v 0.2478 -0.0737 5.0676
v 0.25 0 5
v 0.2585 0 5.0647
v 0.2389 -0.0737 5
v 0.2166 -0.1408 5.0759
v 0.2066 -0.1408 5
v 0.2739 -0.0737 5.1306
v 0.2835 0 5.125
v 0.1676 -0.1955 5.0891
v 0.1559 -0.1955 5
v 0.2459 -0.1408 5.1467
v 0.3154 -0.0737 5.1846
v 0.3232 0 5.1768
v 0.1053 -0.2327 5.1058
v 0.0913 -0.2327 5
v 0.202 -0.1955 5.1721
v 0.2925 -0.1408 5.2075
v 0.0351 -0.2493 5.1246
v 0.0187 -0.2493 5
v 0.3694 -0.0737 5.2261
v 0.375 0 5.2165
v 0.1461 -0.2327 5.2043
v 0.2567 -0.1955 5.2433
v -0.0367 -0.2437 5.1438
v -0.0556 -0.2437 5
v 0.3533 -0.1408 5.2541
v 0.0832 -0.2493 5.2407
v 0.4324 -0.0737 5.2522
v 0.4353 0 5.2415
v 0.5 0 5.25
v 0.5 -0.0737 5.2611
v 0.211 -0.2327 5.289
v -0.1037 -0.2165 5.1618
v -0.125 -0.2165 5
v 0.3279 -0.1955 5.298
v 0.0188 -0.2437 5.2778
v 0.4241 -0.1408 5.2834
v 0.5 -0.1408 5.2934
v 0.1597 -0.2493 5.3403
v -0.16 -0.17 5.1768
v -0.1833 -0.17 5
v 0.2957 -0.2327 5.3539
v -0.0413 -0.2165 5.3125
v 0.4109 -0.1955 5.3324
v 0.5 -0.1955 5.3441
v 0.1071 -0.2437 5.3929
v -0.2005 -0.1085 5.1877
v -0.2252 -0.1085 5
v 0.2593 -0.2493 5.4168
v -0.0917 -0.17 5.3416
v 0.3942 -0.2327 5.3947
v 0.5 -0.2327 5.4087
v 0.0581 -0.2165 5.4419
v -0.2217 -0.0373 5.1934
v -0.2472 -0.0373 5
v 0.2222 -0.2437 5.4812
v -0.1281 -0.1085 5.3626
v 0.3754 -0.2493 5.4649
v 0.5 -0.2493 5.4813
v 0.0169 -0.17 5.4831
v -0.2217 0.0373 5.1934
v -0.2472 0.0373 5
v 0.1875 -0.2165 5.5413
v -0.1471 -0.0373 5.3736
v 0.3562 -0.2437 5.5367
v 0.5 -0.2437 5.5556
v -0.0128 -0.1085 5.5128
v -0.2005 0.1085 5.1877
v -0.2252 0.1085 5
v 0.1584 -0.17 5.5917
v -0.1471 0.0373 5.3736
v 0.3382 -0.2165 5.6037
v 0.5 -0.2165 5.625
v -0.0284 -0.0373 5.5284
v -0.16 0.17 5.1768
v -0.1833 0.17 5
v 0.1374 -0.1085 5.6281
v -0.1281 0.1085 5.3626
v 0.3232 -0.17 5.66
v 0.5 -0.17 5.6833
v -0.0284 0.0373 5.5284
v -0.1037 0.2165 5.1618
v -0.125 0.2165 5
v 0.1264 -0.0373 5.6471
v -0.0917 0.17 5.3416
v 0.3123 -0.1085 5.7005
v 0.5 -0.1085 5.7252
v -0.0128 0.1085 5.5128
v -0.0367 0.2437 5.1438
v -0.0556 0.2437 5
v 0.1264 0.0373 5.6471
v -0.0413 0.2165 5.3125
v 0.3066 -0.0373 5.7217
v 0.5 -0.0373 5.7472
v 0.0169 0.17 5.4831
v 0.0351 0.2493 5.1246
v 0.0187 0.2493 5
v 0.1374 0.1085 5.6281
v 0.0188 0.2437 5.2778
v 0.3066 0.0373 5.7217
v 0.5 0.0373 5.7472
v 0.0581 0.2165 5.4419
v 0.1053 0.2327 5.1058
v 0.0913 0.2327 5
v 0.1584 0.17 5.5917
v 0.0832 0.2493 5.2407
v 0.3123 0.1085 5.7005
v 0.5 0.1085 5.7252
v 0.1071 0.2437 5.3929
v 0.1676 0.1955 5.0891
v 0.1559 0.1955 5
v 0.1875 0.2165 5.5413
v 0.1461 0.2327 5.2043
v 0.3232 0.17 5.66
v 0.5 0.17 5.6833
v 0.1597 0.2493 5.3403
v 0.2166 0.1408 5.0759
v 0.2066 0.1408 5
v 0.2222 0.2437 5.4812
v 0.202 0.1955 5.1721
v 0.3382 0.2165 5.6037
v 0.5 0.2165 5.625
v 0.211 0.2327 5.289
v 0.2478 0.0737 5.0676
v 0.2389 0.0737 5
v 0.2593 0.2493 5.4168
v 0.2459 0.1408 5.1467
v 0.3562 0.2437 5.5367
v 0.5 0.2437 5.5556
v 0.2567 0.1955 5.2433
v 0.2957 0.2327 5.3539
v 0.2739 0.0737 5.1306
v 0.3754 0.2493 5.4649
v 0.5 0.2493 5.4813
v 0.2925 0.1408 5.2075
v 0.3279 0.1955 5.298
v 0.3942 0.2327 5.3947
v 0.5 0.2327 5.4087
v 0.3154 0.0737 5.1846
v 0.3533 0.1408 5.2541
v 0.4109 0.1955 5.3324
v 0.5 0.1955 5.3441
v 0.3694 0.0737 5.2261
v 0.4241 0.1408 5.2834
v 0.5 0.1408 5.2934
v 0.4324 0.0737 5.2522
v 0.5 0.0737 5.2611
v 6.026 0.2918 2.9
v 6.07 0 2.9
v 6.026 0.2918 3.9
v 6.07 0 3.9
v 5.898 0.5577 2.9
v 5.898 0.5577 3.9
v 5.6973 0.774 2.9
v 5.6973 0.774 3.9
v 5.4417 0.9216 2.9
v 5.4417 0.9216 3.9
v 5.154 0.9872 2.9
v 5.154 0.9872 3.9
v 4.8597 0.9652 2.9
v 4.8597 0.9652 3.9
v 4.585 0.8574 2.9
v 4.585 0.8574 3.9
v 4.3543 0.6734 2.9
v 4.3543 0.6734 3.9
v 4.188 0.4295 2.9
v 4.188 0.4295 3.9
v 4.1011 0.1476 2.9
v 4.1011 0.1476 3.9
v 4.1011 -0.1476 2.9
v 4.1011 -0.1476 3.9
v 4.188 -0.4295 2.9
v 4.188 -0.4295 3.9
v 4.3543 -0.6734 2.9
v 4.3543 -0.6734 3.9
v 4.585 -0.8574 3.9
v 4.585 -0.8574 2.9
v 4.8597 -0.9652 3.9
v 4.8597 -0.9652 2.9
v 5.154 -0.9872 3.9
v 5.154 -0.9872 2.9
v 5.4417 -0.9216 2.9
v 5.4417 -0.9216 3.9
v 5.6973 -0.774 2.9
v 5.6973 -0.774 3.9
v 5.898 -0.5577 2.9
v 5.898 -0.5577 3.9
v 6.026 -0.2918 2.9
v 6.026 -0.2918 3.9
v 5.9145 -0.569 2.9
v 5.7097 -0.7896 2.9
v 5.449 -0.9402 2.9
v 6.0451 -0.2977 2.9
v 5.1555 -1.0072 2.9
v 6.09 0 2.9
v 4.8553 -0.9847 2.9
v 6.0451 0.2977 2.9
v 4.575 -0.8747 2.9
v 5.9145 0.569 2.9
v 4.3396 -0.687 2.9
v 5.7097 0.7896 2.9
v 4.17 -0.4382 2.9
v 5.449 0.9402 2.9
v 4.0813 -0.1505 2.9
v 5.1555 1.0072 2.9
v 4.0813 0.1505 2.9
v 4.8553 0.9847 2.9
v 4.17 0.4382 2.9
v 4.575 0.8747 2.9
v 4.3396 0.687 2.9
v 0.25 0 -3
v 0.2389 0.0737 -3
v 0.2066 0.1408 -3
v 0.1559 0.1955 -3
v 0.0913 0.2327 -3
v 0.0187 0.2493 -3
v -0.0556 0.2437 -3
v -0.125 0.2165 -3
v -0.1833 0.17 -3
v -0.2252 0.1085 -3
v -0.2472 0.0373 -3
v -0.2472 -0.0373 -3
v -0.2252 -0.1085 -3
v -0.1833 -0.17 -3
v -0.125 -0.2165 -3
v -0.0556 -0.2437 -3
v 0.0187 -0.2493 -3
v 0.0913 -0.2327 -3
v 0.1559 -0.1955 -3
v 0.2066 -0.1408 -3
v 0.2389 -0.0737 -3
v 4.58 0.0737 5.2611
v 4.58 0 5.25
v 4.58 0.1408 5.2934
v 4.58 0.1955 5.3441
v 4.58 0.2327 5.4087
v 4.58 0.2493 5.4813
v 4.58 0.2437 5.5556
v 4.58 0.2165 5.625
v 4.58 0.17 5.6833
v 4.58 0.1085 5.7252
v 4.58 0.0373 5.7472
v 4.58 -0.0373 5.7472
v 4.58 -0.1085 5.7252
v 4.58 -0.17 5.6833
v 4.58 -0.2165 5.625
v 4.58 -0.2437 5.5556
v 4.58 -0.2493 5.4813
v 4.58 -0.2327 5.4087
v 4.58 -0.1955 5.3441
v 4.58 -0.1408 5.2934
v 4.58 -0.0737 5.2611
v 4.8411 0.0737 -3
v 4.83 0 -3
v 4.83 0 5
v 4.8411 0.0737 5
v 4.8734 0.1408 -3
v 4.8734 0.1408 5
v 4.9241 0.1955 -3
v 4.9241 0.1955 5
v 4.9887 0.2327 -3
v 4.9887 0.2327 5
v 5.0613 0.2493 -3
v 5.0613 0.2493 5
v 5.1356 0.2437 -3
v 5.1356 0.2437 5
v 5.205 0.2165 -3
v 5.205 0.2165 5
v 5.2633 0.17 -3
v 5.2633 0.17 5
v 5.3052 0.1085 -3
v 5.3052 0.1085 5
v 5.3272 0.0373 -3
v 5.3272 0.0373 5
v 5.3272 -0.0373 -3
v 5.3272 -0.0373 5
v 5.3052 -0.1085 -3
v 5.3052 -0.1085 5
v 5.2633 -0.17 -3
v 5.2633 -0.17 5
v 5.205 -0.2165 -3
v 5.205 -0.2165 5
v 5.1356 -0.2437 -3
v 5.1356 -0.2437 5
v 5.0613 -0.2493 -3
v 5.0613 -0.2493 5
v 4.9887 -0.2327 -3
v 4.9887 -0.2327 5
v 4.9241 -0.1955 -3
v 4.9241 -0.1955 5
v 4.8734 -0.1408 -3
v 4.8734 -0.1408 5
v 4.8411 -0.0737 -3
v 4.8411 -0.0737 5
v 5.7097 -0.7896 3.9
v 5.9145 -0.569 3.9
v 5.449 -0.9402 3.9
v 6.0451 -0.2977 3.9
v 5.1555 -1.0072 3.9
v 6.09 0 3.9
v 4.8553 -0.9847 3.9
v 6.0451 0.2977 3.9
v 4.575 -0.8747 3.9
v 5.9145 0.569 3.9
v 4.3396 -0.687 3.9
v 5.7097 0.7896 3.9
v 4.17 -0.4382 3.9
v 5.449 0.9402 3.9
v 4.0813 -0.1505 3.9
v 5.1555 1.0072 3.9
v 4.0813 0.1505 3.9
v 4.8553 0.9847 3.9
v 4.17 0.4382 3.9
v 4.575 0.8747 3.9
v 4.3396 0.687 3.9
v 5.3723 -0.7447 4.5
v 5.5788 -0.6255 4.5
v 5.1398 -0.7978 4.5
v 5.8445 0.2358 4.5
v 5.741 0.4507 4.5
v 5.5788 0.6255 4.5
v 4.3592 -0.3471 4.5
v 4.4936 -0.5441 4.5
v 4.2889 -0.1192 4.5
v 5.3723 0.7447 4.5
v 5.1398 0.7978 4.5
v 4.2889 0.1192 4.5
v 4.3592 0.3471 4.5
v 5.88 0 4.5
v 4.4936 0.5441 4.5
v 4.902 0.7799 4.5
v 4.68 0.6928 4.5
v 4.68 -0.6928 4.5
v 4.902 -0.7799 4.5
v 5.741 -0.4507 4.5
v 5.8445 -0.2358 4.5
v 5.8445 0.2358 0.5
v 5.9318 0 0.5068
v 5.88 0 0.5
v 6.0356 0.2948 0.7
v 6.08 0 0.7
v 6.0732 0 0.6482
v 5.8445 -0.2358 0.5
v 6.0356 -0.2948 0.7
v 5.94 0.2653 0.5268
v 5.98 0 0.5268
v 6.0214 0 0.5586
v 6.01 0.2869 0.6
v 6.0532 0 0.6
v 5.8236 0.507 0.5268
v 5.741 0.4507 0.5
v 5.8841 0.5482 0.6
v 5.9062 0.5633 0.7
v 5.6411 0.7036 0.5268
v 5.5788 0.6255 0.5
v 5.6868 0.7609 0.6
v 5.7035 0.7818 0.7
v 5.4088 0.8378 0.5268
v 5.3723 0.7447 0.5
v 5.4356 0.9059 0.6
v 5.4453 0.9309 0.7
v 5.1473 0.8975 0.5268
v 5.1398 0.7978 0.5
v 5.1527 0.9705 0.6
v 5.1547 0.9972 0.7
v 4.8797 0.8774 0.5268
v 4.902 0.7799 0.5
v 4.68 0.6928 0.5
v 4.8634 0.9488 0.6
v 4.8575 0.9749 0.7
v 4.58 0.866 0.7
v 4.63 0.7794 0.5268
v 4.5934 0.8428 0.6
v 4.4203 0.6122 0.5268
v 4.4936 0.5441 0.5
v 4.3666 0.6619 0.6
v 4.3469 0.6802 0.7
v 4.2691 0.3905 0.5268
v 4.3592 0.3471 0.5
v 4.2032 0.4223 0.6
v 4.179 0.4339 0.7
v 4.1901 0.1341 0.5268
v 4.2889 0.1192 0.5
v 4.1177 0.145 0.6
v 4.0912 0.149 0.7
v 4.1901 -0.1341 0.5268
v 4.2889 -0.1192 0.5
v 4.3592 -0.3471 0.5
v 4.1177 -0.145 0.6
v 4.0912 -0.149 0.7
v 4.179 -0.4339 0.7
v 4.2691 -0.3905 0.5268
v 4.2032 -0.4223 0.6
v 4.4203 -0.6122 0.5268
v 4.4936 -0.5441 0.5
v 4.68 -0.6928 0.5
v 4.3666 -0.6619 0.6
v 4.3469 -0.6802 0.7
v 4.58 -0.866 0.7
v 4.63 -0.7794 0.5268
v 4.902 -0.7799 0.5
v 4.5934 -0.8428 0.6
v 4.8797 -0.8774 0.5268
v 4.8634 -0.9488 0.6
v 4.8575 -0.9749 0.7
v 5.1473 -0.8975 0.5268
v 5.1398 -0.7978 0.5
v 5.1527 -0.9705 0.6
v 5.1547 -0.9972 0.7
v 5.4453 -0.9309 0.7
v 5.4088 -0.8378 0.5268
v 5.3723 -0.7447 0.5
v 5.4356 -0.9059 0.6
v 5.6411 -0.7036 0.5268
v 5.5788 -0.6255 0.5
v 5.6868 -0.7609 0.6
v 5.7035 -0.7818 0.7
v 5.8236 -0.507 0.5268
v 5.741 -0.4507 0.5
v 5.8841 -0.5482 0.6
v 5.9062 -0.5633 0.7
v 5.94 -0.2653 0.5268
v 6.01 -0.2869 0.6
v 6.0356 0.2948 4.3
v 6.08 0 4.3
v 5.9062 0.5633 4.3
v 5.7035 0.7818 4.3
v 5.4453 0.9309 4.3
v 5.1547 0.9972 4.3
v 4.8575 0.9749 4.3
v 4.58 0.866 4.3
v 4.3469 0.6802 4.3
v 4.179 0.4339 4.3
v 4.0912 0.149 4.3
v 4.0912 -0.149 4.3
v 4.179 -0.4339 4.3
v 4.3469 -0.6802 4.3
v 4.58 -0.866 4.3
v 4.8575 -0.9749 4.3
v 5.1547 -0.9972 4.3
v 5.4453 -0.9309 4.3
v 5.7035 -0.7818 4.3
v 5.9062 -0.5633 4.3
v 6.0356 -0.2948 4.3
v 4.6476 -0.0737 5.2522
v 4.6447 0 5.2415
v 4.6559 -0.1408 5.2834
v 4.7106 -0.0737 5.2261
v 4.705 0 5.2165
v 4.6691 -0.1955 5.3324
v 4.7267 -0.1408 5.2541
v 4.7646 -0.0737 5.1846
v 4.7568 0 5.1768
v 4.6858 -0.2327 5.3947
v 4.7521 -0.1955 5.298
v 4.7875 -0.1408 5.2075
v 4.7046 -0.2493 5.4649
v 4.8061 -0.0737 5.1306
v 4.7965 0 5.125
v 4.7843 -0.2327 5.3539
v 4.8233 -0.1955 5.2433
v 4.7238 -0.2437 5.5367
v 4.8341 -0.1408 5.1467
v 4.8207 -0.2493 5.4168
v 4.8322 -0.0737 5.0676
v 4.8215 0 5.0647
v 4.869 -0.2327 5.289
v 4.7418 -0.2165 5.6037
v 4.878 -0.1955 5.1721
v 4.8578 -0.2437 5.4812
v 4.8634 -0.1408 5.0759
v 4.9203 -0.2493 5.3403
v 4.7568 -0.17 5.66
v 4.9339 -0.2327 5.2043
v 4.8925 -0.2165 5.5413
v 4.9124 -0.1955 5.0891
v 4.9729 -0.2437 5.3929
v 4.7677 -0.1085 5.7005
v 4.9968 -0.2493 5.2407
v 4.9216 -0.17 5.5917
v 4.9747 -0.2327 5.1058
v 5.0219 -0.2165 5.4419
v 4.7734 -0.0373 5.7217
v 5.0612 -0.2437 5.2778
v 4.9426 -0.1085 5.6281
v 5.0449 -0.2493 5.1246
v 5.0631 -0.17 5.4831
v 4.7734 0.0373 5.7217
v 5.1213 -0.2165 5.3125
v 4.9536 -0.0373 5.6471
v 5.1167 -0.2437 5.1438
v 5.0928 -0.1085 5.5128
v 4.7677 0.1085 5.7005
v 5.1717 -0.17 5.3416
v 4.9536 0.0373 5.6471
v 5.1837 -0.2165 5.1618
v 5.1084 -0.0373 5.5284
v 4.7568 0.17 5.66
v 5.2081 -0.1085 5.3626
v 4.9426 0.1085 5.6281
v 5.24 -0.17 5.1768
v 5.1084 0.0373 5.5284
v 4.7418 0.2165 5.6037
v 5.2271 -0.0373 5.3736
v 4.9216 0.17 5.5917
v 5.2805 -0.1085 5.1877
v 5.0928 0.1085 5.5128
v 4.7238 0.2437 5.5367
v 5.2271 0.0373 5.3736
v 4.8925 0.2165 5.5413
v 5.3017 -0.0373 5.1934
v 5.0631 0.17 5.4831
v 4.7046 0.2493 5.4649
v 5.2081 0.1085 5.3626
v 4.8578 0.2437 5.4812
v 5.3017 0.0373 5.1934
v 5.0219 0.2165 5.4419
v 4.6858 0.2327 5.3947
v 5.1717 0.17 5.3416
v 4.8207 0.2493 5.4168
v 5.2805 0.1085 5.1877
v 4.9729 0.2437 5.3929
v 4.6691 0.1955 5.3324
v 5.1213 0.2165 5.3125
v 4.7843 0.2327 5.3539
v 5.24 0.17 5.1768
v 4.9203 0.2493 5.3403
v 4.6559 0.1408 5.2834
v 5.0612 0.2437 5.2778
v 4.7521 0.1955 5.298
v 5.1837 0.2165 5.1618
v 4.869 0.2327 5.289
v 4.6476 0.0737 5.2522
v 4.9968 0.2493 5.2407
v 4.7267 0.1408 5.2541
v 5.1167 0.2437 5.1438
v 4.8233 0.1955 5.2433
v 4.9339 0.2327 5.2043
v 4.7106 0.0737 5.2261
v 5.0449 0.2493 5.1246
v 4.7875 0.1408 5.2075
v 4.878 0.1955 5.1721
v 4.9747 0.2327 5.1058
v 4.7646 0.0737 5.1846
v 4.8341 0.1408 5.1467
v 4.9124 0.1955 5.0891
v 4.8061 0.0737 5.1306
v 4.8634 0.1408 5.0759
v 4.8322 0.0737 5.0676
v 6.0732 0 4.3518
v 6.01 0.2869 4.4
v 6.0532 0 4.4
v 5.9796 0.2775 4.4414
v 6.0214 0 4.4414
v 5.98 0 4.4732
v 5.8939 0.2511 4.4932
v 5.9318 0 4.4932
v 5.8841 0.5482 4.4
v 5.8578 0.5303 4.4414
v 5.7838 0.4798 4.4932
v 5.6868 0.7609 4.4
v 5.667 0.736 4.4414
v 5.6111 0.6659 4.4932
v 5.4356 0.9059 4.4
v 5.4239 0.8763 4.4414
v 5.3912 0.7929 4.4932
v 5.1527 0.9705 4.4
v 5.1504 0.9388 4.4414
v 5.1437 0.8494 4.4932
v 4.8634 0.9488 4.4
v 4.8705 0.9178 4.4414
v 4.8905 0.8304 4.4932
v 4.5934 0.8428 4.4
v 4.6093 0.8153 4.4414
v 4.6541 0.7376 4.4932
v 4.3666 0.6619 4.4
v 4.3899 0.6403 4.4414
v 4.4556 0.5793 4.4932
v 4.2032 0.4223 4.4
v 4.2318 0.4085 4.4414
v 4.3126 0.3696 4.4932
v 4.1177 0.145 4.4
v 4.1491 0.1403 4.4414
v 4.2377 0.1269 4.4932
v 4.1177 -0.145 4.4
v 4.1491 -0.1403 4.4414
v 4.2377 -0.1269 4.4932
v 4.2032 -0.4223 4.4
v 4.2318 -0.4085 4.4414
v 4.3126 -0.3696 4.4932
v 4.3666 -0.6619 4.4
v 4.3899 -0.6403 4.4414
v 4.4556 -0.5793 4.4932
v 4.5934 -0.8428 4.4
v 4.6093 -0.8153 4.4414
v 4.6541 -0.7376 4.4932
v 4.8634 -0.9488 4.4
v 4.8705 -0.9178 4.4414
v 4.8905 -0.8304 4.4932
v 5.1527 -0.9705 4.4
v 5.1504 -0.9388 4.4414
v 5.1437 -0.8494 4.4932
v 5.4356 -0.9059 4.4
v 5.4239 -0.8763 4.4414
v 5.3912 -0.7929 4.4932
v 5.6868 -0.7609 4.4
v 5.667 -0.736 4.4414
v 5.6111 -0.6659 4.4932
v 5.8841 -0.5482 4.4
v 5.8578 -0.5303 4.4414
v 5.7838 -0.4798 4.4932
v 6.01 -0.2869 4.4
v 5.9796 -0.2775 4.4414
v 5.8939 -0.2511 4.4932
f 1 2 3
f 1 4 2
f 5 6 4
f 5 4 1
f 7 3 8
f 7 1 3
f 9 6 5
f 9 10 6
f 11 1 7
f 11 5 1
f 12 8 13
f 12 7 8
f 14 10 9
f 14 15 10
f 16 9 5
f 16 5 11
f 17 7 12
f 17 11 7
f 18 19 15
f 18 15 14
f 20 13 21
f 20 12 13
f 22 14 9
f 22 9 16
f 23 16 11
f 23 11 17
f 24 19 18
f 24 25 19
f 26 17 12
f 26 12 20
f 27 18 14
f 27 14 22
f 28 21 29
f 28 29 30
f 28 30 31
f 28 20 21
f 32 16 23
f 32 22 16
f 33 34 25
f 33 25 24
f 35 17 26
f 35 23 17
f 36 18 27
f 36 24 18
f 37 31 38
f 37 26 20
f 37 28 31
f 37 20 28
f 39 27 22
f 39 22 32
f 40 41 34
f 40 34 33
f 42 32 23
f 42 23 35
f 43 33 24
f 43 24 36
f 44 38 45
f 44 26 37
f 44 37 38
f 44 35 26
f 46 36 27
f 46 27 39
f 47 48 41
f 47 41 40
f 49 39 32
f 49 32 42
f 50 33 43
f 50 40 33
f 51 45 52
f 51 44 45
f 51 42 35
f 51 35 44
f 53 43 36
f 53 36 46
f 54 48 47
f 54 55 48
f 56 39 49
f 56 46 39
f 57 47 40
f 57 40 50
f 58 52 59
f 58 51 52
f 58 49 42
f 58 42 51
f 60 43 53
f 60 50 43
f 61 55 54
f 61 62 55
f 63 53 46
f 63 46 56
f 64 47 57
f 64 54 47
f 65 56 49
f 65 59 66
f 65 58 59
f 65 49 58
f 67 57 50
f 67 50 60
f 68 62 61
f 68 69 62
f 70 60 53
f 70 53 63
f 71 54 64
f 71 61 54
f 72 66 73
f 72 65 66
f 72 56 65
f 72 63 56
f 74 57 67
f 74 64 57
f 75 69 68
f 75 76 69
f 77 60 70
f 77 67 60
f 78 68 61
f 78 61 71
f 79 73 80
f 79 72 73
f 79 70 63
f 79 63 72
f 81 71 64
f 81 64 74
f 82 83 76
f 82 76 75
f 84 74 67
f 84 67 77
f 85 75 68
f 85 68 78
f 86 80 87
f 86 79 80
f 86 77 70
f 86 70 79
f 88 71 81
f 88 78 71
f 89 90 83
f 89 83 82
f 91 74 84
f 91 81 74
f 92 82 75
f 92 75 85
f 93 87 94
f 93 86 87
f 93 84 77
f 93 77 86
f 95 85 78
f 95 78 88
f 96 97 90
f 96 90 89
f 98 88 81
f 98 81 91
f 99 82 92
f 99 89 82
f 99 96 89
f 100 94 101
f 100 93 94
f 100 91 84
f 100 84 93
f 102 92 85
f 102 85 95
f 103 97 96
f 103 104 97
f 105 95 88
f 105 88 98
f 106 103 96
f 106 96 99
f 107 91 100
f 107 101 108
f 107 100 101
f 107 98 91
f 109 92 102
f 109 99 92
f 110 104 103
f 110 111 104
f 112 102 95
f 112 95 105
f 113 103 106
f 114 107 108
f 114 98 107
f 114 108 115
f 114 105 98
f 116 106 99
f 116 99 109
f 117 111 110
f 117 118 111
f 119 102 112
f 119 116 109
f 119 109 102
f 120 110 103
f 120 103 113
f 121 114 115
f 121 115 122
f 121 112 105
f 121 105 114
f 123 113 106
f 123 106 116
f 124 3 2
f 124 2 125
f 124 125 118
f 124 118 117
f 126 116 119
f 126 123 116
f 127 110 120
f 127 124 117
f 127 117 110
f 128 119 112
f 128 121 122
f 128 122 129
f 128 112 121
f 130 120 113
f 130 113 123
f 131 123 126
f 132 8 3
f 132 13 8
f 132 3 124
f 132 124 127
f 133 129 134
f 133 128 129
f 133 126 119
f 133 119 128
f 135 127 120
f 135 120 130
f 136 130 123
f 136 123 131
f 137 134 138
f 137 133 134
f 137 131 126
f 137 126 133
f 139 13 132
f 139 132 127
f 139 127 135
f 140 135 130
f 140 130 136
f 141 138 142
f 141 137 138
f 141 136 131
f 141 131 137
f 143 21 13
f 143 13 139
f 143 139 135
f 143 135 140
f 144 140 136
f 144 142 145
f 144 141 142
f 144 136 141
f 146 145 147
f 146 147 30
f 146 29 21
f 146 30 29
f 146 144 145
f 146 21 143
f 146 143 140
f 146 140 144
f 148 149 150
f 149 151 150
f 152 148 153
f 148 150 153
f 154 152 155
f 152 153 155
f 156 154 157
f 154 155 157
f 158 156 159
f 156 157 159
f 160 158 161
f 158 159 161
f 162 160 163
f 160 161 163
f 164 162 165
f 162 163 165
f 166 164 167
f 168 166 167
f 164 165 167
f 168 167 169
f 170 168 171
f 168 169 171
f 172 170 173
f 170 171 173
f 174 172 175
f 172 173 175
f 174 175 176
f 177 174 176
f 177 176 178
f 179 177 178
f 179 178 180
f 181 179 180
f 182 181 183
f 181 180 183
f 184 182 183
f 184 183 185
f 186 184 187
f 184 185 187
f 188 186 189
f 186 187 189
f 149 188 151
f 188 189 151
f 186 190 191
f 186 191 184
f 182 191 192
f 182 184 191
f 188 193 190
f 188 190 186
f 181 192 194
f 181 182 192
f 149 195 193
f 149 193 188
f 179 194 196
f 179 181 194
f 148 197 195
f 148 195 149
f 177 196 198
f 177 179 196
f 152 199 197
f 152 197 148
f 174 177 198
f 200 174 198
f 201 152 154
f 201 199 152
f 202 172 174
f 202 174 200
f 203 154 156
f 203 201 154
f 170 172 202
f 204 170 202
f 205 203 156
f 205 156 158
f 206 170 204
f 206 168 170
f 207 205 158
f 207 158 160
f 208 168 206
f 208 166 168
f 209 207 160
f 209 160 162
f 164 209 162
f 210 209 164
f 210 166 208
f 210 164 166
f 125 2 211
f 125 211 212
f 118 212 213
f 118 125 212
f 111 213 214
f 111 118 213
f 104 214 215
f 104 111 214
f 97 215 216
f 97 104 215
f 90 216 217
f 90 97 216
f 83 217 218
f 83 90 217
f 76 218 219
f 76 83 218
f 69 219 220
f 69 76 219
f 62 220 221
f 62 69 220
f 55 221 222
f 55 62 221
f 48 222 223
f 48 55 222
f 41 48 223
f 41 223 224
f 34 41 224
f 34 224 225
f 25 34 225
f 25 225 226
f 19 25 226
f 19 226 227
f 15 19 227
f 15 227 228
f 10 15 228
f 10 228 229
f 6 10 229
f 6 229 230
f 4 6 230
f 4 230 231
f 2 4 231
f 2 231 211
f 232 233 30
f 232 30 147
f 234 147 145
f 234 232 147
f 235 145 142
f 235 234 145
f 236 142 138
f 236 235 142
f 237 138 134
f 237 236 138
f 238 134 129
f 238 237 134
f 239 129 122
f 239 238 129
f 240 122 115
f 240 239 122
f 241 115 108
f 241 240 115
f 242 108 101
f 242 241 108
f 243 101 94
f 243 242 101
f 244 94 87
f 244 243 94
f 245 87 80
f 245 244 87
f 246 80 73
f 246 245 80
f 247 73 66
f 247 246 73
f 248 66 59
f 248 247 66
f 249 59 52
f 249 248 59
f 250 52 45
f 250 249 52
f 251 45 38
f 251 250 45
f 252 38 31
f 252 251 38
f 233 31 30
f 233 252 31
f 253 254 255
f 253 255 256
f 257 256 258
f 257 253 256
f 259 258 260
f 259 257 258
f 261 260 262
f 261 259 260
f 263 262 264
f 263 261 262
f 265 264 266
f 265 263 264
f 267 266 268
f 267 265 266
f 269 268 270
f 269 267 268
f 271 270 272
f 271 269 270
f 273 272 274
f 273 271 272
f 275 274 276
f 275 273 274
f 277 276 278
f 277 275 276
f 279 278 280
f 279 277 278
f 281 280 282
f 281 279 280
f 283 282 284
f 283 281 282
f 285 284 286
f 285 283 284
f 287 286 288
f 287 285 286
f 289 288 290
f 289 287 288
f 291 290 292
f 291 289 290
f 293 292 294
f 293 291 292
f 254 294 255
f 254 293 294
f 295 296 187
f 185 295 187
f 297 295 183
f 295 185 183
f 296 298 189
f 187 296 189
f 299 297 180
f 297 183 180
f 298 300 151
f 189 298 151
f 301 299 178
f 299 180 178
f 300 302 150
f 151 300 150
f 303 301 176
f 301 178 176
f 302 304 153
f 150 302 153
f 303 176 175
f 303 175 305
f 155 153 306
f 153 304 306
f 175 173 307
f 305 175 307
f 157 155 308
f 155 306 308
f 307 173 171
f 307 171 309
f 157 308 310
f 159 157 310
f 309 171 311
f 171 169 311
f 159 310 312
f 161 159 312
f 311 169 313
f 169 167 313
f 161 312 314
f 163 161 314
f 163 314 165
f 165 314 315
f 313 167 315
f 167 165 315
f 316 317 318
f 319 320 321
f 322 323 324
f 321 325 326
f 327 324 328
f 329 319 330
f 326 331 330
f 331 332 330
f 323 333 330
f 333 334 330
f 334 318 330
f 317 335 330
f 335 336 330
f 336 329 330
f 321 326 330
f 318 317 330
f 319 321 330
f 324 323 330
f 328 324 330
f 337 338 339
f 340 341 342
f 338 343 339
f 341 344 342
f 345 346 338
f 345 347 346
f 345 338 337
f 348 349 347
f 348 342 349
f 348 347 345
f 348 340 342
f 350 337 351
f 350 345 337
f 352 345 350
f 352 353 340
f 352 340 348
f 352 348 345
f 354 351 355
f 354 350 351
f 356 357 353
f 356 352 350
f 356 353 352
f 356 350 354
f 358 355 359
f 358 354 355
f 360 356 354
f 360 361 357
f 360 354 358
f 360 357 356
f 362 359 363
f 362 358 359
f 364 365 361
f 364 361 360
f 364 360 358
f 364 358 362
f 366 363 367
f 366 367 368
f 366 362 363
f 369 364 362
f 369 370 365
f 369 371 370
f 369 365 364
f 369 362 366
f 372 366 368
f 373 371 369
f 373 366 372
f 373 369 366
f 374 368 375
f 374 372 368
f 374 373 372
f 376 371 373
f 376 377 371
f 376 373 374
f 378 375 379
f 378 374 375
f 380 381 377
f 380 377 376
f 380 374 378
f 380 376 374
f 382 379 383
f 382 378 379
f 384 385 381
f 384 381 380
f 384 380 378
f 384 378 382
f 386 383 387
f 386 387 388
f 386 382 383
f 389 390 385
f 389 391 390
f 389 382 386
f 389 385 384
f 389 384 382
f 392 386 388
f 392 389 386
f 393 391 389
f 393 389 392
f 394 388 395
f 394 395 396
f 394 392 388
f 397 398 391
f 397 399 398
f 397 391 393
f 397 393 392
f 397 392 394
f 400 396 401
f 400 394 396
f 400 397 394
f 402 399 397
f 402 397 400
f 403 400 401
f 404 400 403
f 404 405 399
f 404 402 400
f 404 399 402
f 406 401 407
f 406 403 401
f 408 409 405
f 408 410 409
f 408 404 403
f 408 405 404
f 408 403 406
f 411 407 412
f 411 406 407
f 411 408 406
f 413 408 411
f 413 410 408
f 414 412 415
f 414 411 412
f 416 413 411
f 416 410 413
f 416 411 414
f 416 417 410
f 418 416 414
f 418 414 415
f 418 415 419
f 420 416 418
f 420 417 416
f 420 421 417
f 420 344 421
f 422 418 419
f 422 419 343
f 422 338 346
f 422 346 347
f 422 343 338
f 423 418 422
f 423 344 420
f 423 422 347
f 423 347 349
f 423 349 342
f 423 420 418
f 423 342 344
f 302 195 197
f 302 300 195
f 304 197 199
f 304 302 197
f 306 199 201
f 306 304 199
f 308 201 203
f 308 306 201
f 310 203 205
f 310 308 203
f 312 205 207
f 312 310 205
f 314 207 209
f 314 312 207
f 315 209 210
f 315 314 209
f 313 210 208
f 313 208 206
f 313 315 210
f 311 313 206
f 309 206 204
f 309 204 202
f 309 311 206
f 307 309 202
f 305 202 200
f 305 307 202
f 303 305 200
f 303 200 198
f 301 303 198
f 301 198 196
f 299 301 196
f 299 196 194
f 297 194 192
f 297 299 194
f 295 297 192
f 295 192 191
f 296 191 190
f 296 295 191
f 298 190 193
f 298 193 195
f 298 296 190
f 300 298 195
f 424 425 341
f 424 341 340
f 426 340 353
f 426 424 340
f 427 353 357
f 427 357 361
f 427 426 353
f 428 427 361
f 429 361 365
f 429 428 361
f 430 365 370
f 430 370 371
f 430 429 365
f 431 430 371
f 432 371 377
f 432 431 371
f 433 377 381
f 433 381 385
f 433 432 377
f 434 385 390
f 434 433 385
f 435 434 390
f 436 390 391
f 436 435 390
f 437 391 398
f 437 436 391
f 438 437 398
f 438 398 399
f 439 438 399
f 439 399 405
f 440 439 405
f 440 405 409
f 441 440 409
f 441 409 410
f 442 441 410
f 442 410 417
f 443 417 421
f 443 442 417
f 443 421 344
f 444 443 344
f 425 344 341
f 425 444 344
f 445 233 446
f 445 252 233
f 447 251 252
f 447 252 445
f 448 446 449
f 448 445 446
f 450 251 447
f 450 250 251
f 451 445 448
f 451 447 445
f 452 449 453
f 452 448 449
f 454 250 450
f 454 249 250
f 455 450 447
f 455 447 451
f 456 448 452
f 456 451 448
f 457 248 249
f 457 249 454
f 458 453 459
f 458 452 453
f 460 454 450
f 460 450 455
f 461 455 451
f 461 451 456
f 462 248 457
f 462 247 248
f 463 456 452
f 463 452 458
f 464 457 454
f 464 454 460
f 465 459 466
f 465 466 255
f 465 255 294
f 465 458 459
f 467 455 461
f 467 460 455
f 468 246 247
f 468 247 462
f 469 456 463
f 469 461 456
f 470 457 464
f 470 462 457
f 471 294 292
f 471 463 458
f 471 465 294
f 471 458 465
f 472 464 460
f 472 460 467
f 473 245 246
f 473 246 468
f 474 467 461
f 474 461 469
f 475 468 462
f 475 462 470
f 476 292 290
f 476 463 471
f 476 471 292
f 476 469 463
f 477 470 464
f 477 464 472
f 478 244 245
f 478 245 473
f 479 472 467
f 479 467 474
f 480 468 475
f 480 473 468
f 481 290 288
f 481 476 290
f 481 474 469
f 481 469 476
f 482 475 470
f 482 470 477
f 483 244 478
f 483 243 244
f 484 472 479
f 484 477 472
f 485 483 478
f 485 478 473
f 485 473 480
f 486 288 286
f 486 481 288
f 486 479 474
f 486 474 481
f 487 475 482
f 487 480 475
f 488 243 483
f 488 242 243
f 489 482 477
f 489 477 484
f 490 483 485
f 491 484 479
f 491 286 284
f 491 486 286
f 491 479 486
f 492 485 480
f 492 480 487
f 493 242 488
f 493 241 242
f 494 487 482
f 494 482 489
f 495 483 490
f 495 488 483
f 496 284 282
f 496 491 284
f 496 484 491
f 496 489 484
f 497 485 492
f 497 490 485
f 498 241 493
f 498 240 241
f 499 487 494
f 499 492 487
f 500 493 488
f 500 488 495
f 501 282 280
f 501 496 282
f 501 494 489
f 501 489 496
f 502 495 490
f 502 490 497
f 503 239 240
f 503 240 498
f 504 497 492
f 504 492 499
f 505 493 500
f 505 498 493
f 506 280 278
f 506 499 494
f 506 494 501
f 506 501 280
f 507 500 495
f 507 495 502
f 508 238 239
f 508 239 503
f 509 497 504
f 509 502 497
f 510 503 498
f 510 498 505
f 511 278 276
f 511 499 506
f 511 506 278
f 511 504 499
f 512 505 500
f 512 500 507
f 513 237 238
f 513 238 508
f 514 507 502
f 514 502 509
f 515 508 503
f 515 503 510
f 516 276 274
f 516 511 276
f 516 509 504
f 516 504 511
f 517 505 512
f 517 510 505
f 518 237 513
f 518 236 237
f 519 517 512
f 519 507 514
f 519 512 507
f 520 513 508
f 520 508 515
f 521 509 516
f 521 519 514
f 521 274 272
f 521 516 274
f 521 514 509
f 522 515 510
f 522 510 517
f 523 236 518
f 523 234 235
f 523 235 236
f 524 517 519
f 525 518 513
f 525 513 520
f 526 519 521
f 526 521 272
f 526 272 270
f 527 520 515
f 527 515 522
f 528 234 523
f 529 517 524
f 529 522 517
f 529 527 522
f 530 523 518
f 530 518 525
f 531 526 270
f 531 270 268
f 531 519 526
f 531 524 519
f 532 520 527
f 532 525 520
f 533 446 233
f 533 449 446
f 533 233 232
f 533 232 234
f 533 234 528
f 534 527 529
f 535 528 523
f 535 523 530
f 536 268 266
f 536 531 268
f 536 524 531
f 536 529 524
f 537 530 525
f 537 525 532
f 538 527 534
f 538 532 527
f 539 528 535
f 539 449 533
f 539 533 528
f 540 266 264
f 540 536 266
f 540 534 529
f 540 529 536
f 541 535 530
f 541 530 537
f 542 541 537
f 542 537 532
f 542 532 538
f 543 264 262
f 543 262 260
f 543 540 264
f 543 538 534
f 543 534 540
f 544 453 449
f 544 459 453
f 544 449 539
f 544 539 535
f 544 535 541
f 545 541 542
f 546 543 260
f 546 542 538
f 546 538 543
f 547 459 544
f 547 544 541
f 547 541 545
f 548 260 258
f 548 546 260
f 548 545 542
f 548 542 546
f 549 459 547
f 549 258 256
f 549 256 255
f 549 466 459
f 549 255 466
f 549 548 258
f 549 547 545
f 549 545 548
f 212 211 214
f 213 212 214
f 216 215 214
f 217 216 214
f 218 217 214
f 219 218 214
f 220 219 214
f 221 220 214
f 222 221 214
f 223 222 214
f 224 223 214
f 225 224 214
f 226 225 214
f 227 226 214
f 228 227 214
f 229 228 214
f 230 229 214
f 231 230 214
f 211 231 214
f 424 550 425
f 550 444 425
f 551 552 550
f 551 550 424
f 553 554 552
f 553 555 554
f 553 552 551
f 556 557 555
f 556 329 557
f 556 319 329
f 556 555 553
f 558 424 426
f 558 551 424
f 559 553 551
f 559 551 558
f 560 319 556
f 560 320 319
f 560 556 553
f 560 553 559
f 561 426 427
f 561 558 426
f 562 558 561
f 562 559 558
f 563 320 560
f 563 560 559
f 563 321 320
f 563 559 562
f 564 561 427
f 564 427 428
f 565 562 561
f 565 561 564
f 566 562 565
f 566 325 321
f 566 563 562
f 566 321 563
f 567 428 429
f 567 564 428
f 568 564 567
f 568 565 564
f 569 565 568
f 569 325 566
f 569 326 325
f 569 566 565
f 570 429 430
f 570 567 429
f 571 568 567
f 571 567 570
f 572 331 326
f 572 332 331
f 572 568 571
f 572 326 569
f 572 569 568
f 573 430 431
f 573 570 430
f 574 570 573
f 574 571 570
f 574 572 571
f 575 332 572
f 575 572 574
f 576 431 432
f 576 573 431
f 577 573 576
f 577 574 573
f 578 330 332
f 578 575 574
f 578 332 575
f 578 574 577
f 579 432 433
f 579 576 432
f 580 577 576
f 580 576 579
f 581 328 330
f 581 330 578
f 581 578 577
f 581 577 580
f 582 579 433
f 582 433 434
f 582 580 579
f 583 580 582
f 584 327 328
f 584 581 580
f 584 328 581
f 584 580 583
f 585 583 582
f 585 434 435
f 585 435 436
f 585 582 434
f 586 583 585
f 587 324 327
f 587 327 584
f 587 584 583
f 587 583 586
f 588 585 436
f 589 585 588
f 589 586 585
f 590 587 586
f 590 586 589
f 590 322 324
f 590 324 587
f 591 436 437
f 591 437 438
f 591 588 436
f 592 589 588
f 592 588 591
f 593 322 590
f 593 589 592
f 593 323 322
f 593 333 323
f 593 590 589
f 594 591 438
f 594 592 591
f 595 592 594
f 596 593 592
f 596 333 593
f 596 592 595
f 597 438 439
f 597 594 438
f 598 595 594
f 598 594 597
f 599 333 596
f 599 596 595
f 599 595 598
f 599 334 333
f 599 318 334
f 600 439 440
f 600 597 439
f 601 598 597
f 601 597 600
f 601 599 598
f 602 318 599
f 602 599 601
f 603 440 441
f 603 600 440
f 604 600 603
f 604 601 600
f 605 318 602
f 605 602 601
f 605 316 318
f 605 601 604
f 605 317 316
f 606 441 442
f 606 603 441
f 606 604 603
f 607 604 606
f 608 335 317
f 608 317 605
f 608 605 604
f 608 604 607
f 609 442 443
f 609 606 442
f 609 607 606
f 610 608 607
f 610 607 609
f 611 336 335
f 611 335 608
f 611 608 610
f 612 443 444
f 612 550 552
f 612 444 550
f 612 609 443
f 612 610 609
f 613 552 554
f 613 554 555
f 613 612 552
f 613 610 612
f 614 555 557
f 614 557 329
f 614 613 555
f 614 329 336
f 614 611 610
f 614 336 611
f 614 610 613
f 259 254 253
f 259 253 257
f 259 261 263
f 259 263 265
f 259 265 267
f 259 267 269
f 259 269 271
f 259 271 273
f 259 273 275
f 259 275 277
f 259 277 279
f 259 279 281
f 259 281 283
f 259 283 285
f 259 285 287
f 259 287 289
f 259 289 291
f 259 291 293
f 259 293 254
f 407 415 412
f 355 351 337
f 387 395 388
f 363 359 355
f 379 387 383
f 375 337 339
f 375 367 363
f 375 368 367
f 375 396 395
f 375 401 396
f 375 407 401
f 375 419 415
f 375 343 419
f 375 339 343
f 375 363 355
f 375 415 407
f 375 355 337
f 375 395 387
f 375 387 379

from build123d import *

# Parameters (mm, degrees)
SKETCH001_R = 0.25
SKETCH003_W = 0.02
SKETCH003_H = 1
SKETCH002_W = 1
SKETCH002_H = 4
FILLET_R    = 0.2


with BuildPart() as sweep_body:
    # Sweep: sweep along a path in Sketch
    with BuildLine(Plane.XZ) as sweep_path:
        Line((0, -3), (0, 5))
        ThreePointArc((0, 5), (0.146447, 5.353553), (0.5, 5.5))
        Line((0.5, 5.5), (4.58, 5.5))
        ThreePointArc((4.58, 5.5), (4.933553, 5.353553), (5.08, 5))
        Line((5.08, 5), (5.08, -3))
    # Sketch001 → Sweep (sweep)
    with BuildSketch(Plane.XY):
        Circle(SKETCH001_R)
    sweep(path=sweep_path.line)


with BuildPart() as revolution001:
    # Sketch003 → Revolution001 (revolve)
    with BuildSketch(Plane.XZ):
        with Locations((6.08, 3.4)):
            Rectangle(SKETCH003_W, SKETCH003_H)
    revolve(axis=Axis((5.08, 0, 5.9), (0, 0, 1)))


with BuildPart() as fillet_body:
    # Sketch002 → Revolution (revolve)
    with BuildSketch(Plane.XZ):
        with Locations((5.58, 2.5)):
            Rectangle(SKETCH002_W, SKETCH002_H)
    revolve(axis=Axis((5.08, 0, 0.5), (0, 0, 1)))

    # Fillet
    fillet_edges = [fillet_body.edges().sort_by_distance(p)[0] for p in [
        (4.08, 0, 4.5),
        (4.08, 0, 0.5),
    ]]
    fillet(fillet_edges, radius=FILLET_R)


solid = Compound([sweep_body.part, revolution001.part, fillet_body.part])
